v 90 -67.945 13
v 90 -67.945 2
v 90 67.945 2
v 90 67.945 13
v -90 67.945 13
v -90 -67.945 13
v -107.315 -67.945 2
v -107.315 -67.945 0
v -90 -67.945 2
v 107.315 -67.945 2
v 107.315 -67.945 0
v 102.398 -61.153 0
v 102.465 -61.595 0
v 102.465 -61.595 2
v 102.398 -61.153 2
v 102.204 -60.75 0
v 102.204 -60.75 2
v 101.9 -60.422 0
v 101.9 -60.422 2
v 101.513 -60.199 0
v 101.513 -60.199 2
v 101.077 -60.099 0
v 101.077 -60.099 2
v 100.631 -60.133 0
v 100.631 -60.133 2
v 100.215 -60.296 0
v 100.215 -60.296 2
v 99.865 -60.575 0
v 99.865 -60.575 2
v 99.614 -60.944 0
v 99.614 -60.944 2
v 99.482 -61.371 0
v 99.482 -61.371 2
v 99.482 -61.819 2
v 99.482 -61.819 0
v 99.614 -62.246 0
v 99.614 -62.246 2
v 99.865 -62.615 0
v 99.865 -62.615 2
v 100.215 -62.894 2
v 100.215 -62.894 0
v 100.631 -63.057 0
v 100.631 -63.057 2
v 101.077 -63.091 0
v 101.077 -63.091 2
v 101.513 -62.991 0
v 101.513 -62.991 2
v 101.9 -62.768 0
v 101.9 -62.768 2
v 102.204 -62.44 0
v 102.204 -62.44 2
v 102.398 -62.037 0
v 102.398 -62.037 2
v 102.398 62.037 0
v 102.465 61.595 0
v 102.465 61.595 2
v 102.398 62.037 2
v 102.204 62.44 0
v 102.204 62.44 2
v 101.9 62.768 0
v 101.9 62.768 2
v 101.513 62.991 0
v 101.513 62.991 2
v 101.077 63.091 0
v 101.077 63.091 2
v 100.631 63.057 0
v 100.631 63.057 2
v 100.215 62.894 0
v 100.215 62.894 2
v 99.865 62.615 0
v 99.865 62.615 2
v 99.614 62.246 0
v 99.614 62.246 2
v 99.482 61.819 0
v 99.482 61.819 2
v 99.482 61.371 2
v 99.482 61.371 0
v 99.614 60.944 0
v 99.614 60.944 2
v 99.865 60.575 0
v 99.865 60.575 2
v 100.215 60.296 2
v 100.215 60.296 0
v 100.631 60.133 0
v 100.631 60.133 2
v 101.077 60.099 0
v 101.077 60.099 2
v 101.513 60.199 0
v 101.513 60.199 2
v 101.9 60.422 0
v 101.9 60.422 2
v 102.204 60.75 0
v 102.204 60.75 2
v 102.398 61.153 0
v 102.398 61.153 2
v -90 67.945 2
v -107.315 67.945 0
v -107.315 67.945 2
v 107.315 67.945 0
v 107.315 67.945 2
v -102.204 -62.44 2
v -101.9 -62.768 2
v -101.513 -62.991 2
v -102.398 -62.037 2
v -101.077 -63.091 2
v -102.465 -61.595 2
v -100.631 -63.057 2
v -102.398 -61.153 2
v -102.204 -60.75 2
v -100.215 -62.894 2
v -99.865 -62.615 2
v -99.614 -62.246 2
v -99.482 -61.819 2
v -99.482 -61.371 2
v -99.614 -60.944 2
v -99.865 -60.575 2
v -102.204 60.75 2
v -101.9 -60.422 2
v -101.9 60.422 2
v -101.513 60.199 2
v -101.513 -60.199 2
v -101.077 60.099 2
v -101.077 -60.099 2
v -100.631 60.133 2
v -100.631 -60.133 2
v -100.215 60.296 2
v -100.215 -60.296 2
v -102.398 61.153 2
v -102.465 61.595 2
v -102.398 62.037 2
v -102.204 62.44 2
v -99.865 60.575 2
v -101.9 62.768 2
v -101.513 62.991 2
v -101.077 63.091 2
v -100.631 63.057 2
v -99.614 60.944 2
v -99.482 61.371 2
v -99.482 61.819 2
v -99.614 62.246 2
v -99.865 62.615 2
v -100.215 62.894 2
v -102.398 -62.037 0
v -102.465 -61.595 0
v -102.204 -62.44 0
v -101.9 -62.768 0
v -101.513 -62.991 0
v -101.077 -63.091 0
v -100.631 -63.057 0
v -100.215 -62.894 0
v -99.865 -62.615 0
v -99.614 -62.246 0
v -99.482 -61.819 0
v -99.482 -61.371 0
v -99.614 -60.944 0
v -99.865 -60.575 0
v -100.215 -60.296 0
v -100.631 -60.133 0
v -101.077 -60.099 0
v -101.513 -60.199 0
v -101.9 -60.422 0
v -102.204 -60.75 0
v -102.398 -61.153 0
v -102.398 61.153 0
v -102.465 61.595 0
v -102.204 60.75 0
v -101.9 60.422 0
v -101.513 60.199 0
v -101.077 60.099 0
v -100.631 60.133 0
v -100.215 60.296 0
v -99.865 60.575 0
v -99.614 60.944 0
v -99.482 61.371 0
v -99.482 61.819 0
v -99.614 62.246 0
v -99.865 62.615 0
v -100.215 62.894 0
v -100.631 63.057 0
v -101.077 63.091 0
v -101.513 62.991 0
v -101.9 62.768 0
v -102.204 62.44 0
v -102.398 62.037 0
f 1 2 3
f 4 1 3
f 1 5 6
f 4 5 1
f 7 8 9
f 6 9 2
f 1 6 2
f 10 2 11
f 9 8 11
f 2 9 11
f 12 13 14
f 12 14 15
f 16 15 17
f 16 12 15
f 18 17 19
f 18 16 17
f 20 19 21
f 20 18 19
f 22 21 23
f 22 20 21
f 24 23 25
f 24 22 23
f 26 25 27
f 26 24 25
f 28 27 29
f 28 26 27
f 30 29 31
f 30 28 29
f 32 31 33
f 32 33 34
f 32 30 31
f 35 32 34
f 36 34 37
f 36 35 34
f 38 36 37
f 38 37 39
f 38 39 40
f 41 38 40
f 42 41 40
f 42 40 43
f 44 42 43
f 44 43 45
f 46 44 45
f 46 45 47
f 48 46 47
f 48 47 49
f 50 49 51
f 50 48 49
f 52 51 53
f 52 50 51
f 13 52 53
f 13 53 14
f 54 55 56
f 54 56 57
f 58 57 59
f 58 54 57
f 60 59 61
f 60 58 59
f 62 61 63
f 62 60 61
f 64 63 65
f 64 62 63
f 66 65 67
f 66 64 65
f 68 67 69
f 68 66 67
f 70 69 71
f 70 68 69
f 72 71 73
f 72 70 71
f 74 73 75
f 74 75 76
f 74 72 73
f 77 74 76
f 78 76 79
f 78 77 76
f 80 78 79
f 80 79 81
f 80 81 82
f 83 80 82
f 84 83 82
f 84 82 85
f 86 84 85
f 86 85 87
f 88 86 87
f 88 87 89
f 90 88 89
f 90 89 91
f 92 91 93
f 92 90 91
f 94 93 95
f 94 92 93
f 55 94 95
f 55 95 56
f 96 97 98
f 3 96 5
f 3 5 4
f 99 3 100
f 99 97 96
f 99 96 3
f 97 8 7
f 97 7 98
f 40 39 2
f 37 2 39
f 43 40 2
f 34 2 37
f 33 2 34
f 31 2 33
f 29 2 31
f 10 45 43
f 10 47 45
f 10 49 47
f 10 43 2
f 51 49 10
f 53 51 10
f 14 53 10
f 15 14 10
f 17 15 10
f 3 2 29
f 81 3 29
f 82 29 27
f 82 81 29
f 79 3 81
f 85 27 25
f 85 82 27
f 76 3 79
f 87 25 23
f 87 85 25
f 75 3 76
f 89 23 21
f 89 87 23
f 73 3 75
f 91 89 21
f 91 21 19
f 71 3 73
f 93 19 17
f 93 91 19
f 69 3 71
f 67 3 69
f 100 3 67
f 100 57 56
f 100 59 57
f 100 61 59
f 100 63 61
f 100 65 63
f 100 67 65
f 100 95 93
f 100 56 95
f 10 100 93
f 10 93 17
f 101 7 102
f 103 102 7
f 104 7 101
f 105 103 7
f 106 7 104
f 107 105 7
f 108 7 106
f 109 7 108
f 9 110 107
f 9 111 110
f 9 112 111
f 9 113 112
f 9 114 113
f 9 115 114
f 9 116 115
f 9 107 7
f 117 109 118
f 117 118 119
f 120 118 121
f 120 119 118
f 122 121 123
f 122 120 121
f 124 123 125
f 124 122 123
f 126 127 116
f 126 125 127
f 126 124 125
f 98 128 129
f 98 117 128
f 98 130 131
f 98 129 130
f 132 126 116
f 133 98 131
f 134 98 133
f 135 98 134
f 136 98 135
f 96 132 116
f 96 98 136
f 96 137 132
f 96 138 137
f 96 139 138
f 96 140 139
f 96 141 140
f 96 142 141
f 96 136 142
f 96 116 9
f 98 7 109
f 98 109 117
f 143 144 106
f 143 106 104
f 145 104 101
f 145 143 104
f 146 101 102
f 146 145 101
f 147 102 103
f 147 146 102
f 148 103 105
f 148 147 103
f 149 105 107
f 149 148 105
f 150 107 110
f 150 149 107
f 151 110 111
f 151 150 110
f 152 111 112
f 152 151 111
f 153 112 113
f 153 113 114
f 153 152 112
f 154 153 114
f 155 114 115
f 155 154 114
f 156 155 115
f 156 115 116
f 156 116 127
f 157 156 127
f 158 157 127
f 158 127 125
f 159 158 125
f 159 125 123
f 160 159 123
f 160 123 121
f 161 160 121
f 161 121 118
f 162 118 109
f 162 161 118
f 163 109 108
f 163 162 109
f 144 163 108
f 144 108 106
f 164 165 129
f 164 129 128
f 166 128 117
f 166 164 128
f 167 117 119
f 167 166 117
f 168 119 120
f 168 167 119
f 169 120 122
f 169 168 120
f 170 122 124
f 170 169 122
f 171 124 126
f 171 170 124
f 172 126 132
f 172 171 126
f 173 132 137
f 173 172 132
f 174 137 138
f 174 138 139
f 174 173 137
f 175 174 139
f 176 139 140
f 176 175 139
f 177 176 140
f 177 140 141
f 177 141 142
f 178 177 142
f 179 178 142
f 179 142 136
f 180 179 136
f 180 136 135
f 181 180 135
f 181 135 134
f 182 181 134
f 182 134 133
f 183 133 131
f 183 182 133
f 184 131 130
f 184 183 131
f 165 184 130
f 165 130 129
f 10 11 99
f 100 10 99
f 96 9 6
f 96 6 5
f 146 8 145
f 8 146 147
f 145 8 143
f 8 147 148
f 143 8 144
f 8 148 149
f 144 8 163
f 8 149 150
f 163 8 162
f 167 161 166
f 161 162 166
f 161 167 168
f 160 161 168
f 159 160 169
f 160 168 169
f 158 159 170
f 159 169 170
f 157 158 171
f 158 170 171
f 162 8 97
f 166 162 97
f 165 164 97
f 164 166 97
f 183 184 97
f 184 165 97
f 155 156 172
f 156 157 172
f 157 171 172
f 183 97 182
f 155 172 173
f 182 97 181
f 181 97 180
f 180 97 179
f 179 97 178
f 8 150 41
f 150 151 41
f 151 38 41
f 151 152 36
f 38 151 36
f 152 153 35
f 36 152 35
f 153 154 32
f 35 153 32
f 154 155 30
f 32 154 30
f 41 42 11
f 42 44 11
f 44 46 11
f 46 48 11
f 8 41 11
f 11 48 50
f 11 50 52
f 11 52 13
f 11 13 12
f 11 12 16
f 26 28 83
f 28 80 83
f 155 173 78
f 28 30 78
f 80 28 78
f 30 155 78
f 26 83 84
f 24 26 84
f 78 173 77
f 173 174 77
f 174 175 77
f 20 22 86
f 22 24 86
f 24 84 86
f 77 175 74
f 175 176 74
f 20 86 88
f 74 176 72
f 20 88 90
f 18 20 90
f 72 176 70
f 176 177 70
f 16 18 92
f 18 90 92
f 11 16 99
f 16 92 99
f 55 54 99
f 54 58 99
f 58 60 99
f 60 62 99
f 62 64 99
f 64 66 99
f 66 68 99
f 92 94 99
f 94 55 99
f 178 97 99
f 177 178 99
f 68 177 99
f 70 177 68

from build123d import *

# Parameters (mm, degrees)
SKETCH_1_W      = 214.63
SKETCH_1_H      = 135.89
SKETCH_1_R      = 1.5
EXTRUDE_1_DEPTH = 2
SKETCH_2_W      = 180
SKETCH_2_H      = 135.89
EXTRUDE_2_DEPTH = 11


with BuildPart() as part:
    # 스케치1 → 보스-돌출1 (new body)
    with BuildSketch(Plane.XY):
        Rectangle(SKETCH_1_W, SKETCH_1_H)
        with Locations((100.965, 61.595)):
            Circle(SKETCH_1_R, mode=Mode.SUBTRACT)
        with Locations((100.965, -61.595)):
            Circle(SKETCH_1_R, mode=Mode.SUBTRACT)
        with Locations(Location((-100.965, -61.595, 0), (0, 0, 180))):
            Circle(SKETCH_1_R, mode=Mode.SUBTRACT)
        with Locations(Location((-100.965, 61.595, 0), (0, 0, 180))):
            Circle(SKETCH_1_R, mode=Mode.SUBTRACT)
    extrude(amount=EXTRUDE_1_DEPTH)

    # 스케치2 → 보스-돌출2 (add)
    with BuildSketch(Plane.XY.offset(2)):
        Rectangle(SKETCH_2_W, SKETCH_2_H)
    extrude(amount=EXTRUDE_2_DEPTH)


solid = part.part
